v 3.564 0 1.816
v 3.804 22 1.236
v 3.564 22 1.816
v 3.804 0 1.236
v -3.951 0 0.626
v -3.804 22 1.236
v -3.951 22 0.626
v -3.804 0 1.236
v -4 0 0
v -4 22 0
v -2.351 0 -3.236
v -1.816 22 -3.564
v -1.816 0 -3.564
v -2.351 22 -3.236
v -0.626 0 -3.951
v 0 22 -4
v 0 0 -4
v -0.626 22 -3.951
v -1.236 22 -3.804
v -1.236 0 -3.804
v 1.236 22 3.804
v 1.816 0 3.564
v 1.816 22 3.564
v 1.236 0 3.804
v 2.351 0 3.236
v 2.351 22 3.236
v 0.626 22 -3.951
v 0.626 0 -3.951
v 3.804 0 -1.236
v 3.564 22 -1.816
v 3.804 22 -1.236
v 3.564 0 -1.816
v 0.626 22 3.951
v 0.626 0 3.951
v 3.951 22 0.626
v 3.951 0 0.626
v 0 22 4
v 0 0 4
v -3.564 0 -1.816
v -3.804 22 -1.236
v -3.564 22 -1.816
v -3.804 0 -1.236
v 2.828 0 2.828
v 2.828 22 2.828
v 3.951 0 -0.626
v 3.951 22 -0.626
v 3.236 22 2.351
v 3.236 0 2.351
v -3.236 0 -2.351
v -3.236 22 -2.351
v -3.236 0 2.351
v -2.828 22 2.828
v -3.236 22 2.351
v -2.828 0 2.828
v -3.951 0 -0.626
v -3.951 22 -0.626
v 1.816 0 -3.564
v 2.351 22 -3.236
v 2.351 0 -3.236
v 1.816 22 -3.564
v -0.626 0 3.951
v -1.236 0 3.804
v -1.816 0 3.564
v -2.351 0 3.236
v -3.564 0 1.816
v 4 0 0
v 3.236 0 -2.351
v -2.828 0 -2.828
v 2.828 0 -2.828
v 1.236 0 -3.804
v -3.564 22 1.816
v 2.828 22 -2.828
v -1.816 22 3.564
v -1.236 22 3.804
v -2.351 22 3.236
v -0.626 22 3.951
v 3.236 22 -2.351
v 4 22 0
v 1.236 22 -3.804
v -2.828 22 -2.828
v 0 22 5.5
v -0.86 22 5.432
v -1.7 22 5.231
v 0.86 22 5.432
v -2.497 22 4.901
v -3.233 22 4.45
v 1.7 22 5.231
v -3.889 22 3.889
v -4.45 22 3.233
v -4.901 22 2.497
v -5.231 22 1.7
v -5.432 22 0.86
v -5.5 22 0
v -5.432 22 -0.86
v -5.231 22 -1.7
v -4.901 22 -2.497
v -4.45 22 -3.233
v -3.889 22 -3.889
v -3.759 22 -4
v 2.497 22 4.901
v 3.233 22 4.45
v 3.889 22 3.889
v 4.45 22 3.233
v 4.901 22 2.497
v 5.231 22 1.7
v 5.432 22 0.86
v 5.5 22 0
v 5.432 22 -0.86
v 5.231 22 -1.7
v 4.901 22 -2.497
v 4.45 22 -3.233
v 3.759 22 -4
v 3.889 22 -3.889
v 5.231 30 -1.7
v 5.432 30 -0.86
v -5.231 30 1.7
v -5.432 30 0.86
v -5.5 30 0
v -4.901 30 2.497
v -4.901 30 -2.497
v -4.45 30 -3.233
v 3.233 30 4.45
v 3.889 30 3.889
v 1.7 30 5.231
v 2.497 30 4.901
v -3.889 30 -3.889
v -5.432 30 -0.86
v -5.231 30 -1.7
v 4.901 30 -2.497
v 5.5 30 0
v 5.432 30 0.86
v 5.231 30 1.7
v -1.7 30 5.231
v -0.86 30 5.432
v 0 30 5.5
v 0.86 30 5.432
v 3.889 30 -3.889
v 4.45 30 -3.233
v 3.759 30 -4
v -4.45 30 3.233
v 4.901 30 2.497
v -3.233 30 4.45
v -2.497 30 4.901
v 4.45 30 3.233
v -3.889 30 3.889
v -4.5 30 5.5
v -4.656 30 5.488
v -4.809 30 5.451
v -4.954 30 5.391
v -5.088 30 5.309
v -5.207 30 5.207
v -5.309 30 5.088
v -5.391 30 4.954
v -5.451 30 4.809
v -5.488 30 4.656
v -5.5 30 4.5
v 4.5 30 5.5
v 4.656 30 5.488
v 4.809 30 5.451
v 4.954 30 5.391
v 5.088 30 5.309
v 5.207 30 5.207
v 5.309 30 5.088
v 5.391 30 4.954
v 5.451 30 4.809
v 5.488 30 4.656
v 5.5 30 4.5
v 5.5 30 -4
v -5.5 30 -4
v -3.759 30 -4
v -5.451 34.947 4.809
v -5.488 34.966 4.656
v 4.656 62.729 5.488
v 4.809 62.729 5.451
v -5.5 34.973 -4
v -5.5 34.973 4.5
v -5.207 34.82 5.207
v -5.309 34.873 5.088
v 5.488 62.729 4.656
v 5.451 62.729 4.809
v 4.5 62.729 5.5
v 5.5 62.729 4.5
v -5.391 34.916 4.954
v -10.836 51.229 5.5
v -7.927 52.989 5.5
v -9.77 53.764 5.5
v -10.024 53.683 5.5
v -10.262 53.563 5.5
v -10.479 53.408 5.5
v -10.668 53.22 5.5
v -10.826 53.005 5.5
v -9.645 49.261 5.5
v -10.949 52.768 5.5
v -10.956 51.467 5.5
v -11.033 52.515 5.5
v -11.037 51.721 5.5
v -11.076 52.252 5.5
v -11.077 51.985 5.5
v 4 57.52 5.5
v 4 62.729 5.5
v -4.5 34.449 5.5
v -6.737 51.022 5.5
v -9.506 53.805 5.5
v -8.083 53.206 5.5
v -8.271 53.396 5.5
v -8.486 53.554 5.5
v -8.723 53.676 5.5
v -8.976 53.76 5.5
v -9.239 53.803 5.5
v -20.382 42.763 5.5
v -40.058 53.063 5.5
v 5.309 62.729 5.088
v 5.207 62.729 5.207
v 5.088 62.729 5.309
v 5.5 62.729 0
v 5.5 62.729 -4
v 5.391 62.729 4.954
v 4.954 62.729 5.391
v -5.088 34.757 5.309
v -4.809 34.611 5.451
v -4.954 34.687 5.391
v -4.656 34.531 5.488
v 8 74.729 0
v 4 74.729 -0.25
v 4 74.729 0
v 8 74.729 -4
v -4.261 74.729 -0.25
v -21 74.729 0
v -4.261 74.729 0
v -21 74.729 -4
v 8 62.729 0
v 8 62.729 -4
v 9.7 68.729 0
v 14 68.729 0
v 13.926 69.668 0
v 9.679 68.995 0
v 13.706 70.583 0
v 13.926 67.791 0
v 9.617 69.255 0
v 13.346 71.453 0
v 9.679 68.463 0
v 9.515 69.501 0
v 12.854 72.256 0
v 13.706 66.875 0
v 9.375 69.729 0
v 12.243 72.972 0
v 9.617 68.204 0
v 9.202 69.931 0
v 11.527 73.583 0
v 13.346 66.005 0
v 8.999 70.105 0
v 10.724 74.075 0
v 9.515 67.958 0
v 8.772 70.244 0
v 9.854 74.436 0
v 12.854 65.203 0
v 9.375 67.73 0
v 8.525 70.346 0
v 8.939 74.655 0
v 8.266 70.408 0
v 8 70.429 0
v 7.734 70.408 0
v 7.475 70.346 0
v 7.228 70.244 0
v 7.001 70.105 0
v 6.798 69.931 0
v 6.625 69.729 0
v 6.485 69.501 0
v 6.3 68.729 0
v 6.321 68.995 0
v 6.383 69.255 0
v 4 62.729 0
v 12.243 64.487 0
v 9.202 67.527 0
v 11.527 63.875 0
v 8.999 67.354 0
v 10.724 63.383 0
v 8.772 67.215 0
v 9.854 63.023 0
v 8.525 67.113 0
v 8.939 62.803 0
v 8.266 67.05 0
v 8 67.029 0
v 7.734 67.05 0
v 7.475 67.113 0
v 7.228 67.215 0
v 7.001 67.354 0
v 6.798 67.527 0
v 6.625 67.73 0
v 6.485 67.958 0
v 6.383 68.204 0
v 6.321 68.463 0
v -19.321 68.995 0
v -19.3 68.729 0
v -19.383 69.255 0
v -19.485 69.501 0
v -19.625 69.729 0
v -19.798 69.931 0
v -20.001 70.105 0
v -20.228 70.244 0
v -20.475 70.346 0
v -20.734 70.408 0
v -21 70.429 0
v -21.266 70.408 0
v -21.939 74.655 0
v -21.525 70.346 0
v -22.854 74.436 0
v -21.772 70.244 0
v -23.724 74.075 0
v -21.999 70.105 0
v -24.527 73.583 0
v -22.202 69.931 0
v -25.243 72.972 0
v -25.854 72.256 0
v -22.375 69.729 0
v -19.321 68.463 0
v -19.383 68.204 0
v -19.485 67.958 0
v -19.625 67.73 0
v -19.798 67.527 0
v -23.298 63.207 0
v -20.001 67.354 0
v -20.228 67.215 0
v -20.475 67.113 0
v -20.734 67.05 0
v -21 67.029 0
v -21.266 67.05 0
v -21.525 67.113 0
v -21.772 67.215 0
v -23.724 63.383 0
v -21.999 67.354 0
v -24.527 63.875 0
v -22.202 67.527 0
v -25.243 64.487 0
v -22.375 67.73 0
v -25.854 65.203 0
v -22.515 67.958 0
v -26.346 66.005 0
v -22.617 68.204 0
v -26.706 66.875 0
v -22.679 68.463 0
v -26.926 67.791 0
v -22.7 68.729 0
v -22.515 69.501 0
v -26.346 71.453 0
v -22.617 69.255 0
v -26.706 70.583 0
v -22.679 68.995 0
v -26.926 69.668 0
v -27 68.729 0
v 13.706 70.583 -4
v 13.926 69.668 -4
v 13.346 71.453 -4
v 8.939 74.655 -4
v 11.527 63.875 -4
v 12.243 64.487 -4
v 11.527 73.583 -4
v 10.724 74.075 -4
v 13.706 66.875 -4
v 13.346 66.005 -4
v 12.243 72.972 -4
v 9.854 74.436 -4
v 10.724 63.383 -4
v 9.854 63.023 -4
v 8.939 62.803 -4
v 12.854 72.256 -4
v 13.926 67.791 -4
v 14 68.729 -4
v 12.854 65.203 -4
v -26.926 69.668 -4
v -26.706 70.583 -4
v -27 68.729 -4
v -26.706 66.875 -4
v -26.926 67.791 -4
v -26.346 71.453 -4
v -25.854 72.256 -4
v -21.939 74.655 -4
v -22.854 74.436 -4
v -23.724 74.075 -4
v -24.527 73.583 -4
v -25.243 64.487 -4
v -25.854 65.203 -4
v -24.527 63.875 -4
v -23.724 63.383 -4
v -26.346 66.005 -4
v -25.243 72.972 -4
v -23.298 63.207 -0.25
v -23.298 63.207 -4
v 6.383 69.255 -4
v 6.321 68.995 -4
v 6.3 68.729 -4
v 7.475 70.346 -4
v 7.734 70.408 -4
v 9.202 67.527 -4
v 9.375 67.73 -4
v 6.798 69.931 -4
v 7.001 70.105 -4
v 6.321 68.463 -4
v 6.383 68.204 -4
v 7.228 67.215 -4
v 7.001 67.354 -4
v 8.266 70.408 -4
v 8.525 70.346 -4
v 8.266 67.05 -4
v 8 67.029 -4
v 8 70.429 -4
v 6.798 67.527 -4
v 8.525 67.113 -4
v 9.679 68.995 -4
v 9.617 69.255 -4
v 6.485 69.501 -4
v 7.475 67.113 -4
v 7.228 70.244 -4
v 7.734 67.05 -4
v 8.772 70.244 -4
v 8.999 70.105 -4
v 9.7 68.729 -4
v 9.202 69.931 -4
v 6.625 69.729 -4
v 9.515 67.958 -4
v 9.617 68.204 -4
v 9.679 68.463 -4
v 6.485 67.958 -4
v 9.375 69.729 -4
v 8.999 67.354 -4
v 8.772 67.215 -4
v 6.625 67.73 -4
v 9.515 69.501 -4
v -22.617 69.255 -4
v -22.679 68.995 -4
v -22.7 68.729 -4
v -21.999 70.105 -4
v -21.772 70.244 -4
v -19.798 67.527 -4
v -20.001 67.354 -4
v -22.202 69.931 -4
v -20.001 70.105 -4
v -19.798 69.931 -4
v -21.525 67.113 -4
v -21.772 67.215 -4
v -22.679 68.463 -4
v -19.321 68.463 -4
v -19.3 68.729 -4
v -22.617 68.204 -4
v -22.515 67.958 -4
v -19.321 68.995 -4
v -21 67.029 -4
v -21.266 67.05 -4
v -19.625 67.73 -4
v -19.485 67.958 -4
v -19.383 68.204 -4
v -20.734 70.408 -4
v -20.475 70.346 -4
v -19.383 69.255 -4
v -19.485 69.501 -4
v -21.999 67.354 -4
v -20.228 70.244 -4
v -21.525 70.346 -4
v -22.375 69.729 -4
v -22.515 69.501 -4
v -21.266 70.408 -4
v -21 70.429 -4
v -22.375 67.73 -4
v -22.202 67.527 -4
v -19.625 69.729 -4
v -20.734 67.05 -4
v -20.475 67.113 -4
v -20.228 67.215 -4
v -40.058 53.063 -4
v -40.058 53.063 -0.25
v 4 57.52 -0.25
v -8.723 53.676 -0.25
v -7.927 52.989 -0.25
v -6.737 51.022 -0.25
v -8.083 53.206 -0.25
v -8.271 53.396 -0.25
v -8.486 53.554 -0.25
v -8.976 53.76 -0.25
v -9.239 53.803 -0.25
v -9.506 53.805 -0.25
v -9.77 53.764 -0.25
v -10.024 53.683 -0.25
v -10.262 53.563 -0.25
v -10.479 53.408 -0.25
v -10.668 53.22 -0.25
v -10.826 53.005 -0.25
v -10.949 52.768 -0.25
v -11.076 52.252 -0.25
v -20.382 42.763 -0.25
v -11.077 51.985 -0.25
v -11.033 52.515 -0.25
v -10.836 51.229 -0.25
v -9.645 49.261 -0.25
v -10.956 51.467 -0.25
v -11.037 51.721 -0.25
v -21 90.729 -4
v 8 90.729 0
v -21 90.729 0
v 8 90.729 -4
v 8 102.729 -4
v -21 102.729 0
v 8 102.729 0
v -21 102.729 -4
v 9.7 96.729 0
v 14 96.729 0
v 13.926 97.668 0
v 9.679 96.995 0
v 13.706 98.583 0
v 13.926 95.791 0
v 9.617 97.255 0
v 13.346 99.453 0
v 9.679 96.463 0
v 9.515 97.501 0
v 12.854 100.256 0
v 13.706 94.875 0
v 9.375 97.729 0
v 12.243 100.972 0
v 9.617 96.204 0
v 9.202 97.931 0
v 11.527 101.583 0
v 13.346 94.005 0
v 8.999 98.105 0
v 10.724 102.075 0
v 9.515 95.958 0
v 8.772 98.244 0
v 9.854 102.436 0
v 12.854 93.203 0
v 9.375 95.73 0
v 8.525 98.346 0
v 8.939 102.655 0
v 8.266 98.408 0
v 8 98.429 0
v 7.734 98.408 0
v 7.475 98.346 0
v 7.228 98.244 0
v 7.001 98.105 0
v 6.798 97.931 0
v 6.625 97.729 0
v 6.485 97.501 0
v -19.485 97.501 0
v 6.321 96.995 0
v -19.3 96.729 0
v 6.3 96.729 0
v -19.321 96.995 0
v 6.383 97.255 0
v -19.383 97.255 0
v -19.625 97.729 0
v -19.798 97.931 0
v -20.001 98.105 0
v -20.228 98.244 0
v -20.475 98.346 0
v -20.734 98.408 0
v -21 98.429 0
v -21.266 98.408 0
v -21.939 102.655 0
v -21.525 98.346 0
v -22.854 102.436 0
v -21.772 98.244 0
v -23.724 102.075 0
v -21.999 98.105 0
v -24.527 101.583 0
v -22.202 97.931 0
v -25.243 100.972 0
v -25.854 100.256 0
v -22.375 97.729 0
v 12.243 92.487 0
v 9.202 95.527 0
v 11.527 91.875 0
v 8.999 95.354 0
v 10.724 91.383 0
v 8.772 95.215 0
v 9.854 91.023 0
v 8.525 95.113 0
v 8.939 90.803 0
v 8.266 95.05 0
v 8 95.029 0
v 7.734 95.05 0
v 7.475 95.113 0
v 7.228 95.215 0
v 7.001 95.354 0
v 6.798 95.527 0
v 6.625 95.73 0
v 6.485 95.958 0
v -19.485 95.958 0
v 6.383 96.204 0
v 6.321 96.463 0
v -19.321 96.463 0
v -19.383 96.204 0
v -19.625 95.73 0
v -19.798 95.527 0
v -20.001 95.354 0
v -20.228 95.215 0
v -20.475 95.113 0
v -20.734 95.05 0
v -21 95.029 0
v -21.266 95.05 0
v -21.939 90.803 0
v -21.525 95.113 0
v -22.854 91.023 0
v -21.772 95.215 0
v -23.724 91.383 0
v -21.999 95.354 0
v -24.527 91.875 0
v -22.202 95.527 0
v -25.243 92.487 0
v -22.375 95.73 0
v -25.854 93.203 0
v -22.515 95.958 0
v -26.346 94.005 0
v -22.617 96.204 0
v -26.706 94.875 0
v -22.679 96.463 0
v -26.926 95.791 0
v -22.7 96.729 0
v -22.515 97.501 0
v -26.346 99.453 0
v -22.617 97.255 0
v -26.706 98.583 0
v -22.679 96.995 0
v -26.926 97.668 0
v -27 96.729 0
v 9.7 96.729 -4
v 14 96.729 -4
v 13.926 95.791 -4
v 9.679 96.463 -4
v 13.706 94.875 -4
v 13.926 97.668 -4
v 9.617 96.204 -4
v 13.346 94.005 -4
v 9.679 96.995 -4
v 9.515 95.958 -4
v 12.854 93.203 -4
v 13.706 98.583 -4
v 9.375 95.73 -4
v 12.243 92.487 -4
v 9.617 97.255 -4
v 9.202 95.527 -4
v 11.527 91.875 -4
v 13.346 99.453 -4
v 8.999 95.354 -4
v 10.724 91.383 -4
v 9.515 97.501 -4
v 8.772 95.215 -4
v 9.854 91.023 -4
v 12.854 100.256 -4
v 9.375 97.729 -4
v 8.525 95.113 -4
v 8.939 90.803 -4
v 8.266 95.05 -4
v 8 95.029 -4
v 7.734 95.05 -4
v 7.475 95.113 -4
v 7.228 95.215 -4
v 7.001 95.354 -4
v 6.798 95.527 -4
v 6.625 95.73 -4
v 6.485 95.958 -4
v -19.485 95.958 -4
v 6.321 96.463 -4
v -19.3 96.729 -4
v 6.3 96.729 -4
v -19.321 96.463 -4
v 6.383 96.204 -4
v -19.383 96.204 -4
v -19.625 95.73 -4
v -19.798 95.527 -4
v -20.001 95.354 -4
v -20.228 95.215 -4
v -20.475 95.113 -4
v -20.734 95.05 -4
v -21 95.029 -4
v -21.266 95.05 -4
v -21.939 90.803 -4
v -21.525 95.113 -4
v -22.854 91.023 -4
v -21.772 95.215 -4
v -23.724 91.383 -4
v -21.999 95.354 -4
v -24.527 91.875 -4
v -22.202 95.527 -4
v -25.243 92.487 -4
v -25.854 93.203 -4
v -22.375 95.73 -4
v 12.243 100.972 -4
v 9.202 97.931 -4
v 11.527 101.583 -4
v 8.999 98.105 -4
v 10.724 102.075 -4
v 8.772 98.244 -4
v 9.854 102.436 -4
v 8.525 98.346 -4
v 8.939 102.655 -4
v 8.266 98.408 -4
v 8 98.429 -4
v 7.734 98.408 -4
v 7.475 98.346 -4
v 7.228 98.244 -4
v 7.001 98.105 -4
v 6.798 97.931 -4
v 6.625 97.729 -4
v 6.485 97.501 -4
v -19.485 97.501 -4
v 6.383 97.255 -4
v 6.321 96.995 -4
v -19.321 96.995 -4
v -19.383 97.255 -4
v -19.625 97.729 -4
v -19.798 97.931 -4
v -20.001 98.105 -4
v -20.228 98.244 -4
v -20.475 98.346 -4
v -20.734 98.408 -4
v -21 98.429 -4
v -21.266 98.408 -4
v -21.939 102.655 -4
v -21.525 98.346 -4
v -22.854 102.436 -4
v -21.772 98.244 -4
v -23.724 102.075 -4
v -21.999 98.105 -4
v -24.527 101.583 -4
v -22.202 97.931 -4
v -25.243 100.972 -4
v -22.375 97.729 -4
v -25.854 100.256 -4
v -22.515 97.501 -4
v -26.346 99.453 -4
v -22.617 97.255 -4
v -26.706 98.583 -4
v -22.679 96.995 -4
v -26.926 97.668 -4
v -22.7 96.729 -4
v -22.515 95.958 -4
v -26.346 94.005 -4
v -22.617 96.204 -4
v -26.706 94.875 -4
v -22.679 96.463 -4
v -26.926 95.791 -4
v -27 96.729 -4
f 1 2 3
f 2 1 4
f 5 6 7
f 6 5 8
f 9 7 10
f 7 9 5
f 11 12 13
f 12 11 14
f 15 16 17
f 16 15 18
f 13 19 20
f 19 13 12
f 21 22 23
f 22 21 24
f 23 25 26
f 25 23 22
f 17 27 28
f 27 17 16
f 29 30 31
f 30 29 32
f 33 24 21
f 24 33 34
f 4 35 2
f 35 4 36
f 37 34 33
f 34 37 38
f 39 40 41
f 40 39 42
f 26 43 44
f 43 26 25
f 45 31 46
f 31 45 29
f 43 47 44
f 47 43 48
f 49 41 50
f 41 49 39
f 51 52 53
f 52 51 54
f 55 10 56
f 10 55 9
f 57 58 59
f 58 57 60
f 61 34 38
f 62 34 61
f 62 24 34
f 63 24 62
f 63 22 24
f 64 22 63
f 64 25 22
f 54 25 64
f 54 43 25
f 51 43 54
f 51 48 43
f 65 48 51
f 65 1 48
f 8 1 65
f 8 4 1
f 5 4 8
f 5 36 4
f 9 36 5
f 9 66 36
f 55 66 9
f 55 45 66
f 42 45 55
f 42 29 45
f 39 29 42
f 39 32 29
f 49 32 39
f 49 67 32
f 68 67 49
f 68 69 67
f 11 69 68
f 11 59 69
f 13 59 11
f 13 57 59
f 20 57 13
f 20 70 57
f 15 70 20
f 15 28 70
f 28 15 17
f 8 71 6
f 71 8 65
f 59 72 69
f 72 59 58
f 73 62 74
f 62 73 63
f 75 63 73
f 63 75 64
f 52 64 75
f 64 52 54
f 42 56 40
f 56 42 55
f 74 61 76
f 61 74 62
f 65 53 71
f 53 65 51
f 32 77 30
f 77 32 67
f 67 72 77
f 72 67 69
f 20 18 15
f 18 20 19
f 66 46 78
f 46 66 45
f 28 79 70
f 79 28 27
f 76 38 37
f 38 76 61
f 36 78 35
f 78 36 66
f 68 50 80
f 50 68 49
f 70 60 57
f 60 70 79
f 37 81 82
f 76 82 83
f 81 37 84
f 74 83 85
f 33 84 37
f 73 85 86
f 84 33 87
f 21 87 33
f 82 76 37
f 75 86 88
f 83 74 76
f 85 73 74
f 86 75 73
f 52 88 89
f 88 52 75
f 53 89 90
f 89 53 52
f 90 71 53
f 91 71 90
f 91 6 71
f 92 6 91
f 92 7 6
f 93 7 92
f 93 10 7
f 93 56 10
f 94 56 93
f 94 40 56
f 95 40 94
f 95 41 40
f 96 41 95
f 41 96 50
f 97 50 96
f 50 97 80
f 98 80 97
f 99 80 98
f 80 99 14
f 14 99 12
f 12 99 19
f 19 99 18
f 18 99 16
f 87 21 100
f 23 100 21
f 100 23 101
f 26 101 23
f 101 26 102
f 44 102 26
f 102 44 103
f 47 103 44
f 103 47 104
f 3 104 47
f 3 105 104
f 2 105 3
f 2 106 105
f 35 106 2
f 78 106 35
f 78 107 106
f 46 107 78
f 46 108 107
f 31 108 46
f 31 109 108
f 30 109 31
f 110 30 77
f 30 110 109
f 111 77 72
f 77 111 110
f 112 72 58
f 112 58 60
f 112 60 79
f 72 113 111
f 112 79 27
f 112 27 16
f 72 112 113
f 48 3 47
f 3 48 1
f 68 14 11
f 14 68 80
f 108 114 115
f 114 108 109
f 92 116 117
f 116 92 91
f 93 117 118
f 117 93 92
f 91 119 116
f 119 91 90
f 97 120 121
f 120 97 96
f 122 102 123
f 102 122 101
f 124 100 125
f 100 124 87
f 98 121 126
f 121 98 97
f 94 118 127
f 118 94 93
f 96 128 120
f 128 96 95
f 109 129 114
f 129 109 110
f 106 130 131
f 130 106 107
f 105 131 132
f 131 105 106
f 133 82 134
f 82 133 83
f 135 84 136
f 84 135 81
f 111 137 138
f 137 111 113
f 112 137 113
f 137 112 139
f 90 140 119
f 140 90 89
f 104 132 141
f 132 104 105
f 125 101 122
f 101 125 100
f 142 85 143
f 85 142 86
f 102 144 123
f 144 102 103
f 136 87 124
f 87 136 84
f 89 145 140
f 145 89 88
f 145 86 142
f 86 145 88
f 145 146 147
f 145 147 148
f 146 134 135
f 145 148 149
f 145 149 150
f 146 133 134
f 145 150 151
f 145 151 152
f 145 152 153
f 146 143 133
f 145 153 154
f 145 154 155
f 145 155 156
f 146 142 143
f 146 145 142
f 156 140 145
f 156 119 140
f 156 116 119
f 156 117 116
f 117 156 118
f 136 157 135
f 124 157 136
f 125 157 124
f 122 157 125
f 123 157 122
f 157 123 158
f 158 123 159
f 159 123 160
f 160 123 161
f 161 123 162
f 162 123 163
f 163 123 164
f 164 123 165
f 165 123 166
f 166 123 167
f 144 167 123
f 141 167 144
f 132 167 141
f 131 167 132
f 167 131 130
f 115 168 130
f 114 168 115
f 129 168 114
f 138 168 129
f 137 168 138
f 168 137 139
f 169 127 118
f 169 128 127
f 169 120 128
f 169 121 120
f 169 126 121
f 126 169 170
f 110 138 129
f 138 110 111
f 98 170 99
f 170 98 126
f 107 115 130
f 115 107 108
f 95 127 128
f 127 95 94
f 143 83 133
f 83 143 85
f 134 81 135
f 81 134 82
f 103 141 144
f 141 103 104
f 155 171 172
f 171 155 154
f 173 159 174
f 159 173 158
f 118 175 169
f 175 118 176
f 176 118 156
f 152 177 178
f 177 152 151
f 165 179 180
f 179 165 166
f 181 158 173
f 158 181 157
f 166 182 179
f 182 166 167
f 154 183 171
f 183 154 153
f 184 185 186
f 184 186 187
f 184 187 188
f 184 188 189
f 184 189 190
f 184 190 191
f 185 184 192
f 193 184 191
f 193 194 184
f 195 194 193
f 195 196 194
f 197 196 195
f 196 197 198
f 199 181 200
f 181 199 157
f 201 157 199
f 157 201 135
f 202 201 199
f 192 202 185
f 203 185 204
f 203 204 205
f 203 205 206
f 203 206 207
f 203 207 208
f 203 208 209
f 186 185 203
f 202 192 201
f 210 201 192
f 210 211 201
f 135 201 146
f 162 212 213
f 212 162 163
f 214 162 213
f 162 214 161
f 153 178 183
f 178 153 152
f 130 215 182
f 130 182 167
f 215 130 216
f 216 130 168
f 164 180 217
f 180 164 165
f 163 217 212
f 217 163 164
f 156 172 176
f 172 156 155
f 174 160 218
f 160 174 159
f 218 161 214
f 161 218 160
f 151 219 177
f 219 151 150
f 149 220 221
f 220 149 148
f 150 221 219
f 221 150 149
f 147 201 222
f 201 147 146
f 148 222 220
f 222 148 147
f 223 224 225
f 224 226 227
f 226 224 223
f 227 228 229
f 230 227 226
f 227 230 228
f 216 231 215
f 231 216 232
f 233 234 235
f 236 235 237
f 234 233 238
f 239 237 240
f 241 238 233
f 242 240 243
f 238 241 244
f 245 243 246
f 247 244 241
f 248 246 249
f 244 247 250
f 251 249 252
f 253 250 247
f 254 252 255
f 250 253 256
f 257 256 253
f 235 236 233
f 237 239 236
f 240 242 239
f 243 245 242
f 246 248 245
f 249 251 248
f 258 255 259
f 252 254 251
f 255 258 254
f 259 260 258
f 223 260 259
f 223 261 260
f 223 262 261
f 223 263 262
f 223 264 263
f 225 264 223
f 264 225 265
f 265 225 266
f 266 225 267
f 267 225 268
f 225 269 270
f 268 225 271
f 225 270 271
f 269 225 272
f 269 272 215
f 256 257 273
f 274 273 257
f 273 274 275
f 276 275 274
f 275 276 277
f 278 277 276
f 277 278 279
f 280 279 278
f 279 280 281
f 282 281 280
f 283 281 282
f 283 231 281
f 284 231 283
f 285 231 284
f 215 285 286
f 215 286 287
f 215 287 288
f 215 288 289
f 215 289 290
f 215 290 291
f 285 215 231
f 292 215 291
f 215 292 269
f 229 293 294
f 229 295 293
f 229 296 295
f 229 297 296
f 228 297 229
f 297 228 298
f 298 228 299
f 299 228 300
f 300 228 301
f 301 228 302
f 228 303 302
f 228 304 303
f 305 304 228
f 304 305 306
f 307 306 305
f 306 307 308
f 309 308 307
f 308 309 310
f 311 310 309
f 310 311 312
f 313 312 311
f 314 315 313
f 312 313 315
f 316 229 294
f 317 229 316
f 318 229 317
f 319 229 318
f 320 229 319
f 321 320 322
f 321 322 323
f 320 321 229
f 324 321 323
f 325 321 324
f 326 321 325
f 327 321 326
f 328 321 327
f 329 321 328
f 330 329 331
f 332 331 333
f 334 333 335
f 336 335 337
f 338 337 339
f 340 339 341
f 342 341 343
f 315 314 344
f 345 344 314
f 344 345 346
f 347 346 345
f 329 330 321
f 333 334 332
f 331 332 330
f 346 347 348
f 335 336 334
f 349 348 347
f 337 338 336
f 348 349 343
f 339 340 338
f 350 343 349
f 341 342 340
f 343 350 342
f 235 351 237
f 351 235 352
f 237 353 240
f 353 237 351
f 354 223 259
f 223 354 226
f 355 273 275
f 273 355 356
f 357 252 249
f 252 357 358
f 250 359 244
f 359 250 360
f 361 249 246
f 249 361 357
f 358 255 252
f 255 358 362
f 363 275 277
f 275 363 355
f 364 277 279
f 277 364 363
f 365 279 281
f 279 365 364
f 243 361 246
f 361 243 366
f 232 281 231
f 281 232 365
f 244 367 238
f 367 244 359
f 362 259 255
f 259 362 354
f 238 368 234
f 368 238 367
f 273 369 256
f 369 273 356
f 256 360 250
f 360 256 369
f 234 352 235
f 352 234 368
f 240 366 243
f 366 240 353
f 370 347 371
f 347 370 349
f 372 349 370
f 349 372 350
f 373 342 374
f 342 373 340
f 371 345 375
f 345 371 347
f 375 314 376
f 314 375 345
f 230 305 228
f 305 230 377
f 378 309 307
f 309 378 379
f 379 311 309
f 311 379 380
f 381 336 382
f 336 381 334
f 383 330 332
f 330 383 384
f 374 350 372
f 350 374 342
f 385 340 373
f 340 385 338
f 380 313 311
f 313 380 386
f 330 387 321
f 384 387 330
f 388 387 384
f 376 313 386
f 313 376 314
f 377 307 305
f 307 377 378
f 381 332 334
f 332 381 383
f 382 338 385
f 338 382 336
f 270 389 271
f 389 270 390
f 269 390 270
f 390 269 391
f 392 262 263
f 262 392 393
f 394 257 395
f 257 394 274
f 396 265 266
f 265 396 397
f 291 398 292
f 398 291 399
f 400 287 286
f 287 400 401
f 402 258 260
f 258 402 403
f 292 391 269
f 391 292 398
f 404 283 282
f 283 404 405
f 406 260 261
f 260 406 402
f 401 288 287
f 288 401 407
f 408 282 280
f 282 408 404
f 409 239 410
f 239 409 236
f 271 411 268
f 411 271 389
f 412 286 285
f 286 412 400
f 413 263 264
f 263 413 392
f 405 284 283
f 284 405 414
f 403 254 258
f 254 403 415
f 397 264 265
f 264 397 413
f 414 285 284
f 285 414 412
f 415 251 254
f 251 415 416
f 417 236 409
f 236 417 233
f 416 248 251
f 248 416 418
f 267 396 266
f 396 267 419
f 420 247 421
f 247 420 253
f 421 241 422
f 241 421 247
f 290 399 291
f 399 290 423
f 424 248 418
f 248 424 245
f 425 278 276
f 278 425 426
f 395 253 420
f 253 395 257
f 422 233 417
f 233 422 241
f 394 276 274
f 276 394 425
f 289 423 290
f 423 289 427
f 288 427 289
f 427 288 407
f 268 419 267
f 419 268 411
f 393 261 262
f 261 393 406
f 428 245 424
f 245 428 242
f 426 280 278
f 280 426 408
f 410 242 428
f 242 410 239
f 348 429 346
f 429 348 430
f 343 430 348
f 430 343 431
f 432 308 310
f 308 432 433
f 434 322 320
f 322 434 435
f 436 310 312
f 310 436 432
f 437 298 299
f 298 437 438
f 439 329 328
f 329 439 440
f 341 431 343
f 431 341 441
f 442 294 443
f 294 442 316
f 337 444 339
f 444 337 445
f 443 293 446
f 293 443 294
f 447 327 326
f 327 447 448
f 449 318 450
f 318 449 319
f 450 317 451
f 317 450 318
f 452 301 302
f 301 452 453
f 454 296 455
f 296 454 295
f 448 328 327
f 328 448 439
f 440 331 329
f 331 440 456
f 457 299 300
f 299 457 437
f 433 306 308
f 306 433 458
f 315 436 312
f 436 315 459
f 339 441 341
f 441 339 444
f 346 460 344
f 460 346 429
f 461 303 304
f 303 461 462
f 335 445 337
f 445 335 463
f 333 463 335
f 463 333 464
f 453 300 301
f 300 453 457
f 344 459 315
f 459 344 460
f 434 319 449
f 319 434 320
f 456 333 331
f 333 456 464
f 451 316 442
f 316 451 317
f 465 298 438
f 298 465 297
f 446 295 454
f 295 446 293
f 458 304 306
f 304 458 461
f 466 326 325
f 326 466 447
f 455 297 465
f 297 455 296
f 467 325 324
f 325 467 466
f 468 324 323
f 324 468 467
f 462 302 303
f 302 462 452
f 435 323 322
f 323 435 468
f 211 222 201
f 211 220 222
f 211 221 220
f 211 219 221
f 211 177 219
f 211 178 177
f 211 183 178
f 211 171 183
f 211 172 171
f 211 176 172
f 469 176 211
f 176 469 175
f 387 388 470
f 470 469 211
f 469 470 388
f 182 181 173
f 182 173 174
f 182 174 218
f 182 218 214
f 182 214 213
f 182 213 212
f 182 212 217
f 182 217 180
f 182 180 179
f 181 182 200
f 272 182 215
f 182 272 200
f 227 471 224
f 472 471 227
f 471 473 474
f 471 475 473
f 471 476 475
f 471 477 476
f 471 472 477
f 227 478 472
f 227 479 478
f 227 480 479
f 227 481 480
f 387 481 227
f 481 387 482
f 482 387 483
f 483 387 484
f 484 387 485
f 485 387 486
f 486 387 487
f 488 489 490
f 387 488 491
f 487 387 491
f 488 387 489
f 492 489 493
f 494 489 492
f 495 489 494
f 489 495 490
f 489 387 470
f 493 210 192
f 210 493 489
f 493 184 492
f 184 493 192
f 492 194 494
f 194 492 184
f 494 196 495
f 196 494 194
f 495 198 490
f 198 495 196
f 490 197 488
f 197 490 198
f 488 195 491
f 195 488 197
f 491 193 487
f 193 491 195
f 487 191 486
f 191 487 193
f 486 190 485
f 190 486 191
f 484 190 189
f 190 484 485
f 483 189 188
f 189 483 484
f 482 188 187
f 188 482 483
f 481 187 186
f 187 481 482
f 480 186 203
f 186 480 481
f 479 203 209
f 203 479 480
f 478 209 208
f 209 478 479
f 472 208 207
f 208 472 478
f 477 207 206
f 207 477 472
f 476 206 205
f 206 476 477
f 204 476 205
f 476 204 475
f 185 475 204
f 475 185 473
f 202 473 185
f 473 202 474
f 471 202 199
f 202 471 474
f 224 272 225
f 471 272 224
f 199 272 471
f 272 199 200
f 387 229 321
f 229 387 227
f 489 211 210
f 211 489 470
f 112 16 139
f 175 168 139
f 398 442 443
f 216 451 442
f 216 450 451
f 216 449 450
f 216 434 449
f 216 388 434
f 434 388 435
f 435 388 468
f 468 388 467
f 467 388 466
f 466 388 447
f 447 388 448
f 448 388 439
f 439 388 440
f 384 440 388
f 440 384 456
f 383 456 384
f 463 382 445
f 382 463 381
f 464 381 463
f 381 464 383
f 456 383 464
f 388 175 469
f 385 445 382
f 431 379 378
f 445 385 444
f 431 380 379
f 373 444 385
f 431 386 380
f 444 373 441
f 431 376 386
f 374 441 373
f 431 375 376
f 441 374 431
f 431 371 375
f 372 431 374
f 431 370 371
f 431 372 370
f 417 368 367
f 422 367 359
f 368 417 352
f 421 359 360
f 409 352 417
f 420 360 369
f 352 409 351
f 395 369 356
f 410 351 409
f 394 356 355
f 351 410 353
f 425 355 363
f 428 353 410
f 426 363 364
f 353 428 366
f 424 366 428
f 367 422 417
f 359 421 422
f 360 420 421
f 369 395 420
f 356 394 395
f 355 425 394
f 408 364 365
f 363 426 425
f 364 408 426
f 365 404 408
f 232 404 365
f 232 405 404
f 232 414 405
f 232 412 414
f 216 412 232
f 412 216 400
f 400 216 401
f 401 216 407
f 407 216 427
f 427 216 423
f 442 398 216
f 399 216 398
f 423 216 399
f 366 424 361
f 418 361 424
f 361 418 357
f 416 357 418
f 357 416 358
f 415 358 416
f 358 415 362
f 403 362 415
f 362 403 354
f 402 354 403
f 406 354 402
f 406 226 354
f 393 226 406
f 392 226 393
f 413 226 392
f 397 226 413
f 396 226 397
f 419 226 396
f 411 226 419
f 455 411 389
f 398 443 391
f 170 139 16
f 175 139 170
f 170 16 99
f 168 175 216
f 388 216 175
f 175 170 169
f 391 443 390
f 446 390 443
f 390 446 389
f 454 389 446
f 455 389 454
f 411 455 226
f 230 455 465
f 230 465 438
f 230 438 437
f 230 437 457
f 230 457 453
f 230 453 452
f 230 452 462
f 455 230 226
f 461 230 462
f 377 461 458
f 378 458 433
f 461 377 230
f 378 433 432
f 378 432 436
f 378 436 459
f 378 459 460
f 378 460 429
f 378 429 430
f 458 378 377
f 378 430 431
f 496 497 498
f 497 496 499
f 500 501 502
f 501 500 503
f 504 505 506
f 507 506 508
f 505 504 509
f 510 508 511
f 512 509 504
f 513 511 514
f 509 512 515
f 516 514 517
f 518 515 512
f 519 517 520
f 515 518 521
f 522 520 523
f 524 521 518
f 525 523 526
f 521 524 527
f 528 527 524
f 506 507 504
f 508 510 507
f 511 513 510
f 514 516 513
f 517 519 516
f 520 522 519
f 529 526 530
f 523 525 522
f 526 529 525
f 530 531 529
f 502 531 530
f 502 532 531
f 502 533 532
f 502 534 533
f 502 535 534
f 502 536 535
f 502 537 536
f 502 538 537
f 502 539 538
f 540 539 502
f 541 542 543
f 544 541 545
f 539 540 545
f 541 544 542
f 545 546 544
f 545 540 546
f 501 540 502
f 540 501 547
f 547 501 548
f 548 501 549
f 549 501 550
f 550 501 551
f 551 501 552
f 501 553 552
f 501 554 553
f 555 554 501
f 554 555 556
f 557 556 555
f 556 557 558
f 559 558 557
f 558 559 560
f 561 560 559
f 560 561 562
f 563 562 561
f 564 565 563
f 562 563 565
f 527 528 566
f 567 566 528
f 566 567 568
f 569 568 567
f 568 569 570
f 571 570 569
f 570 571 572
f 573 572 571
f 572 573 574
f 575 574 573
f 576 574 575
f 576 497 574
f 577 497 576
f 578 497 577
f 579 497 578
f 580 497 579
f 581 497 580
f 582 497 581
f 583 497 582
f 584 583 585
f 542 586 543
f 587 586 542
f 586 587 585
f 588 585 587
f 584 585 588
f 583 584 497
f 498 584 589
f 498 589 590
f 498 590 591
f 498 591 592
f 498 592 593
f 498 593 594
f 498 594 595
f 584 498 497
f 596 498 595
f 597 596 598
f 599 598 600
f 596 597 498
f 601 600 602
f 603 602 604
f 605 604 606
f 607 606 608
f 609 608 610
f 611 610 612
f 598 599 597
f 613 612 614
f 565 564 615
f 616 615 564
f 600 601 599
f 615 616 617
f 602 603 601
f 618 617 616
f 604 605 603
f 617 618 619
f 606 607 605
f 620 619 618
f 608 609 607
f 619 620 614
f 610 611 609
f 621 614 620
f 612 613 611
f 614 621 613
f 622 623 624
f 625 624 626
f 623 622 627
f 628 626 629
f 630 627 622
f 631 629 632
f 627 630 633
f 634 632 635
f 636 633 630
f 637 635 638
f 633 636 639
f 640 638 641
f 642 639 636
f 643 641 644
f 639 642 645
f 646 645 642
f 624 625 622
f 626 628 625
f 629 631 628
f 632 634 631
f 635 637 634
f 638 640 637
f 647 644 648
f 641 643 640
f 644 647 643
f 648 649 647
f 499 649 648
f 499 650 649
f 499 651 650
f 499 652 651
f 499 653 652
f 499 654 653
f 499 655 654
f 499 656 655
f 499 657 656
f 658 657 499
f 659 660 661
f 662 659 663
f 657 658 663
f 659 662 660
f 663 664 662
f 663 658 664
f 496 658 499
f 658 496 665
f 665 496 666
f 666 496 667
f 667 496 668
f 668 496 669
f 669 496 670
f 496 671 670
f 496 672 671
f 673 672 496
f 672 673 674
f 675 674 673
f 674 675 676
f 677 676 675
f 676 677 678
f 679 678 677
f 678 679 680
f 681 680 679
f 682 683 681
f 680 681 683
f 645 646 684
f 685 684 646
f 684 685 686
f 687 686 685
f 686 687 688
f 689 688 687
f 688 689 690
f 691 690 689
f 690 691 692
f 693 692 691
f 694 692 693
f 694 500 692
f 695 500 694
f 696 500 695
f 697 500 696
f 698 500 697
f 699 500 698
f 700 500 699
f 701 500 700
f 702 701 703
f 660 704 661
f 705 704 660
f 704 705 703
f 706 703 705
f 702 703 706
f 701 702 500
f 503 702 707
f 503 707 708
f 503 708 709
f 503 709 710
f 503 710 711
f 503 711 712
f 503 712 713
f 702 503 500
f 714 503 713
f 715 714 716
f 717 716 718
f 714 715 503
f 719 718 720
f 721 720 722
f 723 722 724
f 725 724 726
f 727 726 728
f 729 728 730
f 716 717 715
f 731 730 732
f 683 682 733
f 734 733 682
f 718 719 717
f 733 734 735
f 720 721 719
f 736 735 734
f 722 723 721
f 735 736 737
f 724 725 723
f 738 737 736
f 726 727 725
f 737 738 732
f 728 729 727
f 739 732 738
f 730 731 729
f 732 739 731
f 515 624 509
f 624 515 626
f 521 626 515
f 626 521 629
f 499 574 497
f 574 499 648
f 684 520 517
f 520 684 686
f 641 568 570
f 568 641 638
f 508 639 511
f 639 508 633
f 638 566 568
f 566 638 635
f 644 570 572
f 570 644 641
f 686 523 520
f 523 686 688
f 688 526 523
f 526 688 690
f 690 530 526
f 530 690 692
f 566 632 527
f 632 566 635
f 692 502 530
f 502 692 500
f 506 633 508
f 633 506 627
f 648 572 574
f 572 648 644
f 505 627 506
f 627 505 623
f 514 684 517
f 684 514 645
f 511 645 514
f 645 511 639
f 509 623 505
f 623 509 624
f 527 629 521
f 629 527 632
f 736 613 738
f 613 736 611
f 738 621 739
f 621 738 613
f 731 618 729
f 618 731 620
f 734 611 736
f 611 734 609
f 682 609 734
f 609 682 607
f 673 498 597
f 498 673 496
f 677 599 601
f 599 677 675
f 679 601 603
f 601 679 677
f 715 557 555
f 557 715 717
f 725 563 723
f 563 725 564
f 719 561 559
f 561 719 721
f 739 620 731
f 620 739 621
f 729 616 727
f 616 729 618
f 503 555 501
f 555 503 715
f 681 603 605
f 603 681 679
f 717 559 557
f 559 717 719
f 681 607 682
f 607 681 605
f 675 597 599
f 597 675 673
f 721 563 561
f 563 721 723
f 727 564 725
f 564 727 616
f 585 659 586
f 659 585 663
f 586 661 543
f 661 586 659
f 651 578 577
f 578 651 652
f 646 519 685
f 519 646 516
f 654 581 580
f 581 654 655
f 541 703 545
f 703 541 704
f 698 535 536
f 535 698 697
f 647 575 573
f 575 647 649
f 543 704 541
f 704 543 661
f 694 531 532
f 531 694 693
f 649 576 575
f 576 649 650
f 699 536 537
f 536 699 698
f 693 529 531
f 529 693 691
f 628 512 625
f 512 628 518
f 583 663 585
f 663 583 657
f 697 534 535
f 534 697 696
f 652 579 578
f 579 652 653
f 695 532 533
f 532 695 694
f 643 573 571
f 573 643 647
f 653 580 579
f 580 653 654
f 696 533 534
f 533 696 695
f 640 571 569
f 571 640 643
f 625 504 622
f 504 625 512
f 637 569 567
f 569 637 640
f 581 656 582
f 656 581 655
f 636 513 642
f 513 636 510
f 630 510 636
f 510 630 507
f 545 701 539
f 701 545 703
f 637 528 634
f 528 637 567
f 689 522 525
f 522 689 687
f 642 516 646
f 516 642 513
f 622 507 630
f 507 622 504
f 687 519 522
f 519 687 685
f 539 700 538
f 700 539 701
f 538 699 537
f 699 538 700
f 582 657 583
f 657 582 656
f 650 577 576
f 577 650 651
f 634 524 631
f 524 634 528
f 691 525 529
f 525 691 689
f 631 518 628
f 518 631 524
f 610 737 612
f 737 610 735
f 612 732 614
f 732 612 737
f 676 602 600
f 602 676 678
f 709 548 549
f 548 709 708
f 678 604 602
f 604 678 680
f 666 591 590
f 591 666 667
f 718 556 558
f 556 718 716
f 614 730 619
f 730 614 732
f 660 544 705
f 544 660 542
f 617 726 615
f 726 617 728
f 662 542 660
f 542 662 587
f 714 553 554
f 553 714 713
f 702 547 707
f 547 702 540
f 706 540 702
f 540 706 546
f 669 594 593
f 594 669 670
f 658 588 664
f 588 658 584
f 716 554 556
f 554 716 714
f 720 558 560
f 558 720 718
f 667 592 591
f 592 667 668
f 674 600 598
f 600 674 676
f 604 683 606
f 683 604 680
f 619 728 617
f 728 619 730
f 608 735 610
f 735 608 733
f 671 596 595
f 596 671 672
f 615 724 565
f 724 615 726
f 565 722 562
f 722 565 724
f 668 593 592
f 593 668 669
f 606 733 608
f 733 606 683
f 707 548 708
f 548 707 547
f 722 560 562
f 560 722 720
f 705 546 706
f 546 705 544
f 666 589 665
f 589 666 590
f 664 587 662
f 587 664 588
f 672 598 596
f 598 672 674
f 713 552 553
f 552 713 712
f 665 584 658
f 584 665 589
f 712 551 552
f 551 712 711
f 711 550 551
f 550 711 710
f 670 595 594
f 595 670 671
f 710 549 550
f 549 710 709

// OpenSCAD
// preview[view:north, tilt:top]
/* [Axle] */
// Diameter of the holder axle in mm
AxleDiameter=8;
// Length of the holder axle in mm
AxleLength=22;
// Diameter for the axle stop in mm
AxleStopDiameter=11;
// Axle stop length in mm
AxleStopLength=8;

/* [Knife] */
// Knife blade hight in mm
KnifeHeight=19;
// Knife blade length in mm
KnifeBladeLength=51.5;
// Knife upper length in mm
KnifeUpperLength=28.5;
// Knife thickness in mm
KnifeThickness=0.5;

// Knife bump position from center in mm  +/-
KnifeBumpPositionFromCenter=0;
// Knife bump width in mm
KnifeBumpWidth=3.4;
// Knife bump depth in mm
KnifeBumpDepth=4.0;

// Knife clearance (cutting part) in mm
KnifeClearance=5;
// Knife offset from center in mm
KnifeOffsetFromCenter=4;

/* [Clamp] */
// Clamp screw diameter in mm
ClampScrewDiameter=3;
// Clamp thickness in mm
ClampThickness=4;

/* [Export] */
// 1 flattens the back to print without support
WithoutSupport=1;//[0,1]

// 1 rotates to x axes for printer output
RotateForExport=1;//[0,1]


/* [Hidden] */
$fn=40;

//calculate triangle
a=(KnifeBladeLength/2)-(KnifeUpperLength/2);
b=KnifeHeight;
c=sqrt(pow(a,2)+pow(b,2));
echo(c);
alpha=90-asin(a/c);
echo(alpha);
//gamma
gamma=180-2*alpha;
echo(gamma);
//
triangleSide=(KnifeBladeLength/sin(gamma/2))/2;
echo(triangleSide);
//
pointBalpha=90-alpha;
echo(pointBalpha);
pointBa=sin(pointBalpha)*KnifeBladeLength;
echo(pointBa);
pointBb=sqrt(pow(KnifeBladeLength,2)-pow(pointBa,2));
echo("PointBb ",pointBb);

//Knife
module Knife(){
Knife0=[[0,0],[KnifeBladeLength,0],[KnifeUpperLength+a,KnifeHeight],[a,KnifeHeight]];
Knife0Path=[0,1,2,3];
KnifeBump0=[[a+(KnifeUpperLength/2)+(KnifeBumpWidth/2)+KnifeBumpPositionFromCenter,KnifeHeight],[a+(KnifeUpperLength/2)+(KnifeBumpWidth/2)+KnifeBumpPositionFromCenter,KnifeHeight-KnifeBumpDepth+KnifeBumpWidth/2],[a+(KnifeUpperLength/2)-(KnifeBumpWidth/2)+KnifeBumpPositionFromCenter,KnifeHeight-KnifeBumpDepth+KnifeBumpWidth/2],[a+(KnifeUpperLength/2)-(KnifeBumpWidth/2)+KnifeBumpPositionFromCenter,KnifeHeight]];
KnifeBump0Path=[4,5,6,7];
//KnifeBump1=
KnifeBump1Path=[8,9,10,11,12,13,14,15,16,17,18,19];
Knife=concat(Knife0,KnifeBump0);
KnifePath=[Knife0Path,KnifeBump0Path];
translate([-KnifeOffsetFromCenter,-KnifeThickness/2,AxleLength+AxleStopLength+cubeHeigth+triangleSide])
rotate([-90,90-alpha,0])
linear_extrude(height=AxleStopDiameter)
difference(){
polygon(Knife,KnifePath);
translate([a+(KnifeUpperLength/2)+KnifeBumpPositionFromCenter,KnifeHeight-KnifeBumpDepth+KnifeBumpWidth/2,0]) circle(KnifeBumpWidth/2,$fn12);
}
//#polygon(points=[[0,0],[KnifeBladeLength,0],[KnifeUpperLength+a,KnifeHeight],[a+(KnifeUpperLength/2)+(KnifeBumpWidth/2),KnifeHeight],[a+(KnifeUpperLength/2)+(KnifeBumpWidth/2),KnifeHeight-KnifeBumpDepth],[a+(KnifeUpperLength/2)-(KnifeBumpWidth/2),KnifeHeight-KnifeBumpDepth],[a+(KnifeUpperLength/2)-(KnifeBumpWidth/2),KnifeHeight],[a,KnifeHeight]]);
}

cubeHeigth=0;

//Axle
module Axle(){
cylinder(r=AxleDiameter/2,h=AxleLength);
translate([0,0,AxleLength])
cylinder(r=AxleStopDiameter/2,h=AxleStopLength);
translate([0,0,AxleLength+AxleStopLength+(cubeHeigth+triangleSide-KnifeClearance)/2])
minkowski(){
cube([AxleStopDiameter-2,AxleStopDiameter-2,cubeHeigth+triangleSide-KnifeClearance],center=true);
translate([0,0,0])
cylinder(r=1,h=1);
}}
//KnifeHolder
module KnifeHolder(){
translate([-KnifeOffsetFromCenter,AxleStopDiameter/2,AxleLength+AxleStopLength+cubeHeigth])
rotate([90,0,0])
union(){
translate([pointBb-AxleStopDiameter/2+2,triangleSide-pointBa,AxleStopDiameter/2])
*sphere(r=AxleStopDiameter/2);
linear_extrude(height=AxleStopDiameter)
polygon(points=[[0,0],[pointBb,triangleSide-pointBa],[0,triangleSide]]);
}}

//KnifeClamp
module KnifeClamp(){
clampZPosition=AxleLength+AxleStopLength+(cubeHeigth+triangleSide-KnifeClearance)-12;
clampThickness=AxleStopDiameter/2;
clampHeight=12;
clampWidth=41-clampHeight;
clampXPosition=-4-KnifeOffsetFromCenter;
difference(){
    union(){
        translate([clampXPosition,-clampThickness,clampZPosition])
            cube([clampWidth,AxleStopDiameter/2,clampHeight]);
        translate([clampXPosition,0,clampZPosition+clampHeight/2])
            rotate([90,0,0])
            cylinder(r=clampHeight/2,h=clampThickness);
        translate([clampWidth+clampXPosition,0,clampZPosition+clampHeight/2])
            rotate([90,0,0])
            cylinder(r=clampHeight/2,h=clampThickness);}
    translate([clampXPosition,0,clampZPosition+clampHeight/2])
            rotate([90,0,0])
            cylinder(r=ClampScrewDiameter/2+0.2,h=clampThickness+1);
    translate([clampWidth+clampXPosition,0,clampZPosition+clampHeight/2])
            rotate([90,0,0])
            cylinder(r=ClampScrewDiameter/2+0.2,h=clampThickness+1);
}
}
module KnifeClamp2(){
    translate([0,-AxleStopDiameter/2+ClampThickness,(AxleLength+AxleStopLength+(cubeHeigth+triangleSide-KnifeClearance)-12)*2+40])
    mirror([0,0,1])
    resize([0,ClampThickness,0])
        KnifeClamp();
}
module DragKnifeRotor(){
union(){
difference(){
union(){
    Axle();
    KnifeHolder();
    KnifeClamp();
}
Knife();
translate([0,AxleStopDiameter/2,0]) KnifeClamp();
//cutout for printing without support (flatten the back)
if (WithoutSupport){translate([-100,-AxleDiameter/2,0])
rotate([90,0,0])
cube([200,200,AxleStopDiameter]);}
//cutout for freeing knife tip
translate([0,0,12]) KnifeClamp();
translate([0,AxleStopDiameter/2,12]) KnifeClamp();
}

if (WithoutSupport){translate([0,(AxleStopDiameter-AxleDiameter)/2,0])
KnifeClamp2();
}
else{KnifeClamp2();}
}
}
if(RotateForExport){rotate([-90,180,0])
DragKnifeRotor();
}
else {DragKnifeRotor();}
